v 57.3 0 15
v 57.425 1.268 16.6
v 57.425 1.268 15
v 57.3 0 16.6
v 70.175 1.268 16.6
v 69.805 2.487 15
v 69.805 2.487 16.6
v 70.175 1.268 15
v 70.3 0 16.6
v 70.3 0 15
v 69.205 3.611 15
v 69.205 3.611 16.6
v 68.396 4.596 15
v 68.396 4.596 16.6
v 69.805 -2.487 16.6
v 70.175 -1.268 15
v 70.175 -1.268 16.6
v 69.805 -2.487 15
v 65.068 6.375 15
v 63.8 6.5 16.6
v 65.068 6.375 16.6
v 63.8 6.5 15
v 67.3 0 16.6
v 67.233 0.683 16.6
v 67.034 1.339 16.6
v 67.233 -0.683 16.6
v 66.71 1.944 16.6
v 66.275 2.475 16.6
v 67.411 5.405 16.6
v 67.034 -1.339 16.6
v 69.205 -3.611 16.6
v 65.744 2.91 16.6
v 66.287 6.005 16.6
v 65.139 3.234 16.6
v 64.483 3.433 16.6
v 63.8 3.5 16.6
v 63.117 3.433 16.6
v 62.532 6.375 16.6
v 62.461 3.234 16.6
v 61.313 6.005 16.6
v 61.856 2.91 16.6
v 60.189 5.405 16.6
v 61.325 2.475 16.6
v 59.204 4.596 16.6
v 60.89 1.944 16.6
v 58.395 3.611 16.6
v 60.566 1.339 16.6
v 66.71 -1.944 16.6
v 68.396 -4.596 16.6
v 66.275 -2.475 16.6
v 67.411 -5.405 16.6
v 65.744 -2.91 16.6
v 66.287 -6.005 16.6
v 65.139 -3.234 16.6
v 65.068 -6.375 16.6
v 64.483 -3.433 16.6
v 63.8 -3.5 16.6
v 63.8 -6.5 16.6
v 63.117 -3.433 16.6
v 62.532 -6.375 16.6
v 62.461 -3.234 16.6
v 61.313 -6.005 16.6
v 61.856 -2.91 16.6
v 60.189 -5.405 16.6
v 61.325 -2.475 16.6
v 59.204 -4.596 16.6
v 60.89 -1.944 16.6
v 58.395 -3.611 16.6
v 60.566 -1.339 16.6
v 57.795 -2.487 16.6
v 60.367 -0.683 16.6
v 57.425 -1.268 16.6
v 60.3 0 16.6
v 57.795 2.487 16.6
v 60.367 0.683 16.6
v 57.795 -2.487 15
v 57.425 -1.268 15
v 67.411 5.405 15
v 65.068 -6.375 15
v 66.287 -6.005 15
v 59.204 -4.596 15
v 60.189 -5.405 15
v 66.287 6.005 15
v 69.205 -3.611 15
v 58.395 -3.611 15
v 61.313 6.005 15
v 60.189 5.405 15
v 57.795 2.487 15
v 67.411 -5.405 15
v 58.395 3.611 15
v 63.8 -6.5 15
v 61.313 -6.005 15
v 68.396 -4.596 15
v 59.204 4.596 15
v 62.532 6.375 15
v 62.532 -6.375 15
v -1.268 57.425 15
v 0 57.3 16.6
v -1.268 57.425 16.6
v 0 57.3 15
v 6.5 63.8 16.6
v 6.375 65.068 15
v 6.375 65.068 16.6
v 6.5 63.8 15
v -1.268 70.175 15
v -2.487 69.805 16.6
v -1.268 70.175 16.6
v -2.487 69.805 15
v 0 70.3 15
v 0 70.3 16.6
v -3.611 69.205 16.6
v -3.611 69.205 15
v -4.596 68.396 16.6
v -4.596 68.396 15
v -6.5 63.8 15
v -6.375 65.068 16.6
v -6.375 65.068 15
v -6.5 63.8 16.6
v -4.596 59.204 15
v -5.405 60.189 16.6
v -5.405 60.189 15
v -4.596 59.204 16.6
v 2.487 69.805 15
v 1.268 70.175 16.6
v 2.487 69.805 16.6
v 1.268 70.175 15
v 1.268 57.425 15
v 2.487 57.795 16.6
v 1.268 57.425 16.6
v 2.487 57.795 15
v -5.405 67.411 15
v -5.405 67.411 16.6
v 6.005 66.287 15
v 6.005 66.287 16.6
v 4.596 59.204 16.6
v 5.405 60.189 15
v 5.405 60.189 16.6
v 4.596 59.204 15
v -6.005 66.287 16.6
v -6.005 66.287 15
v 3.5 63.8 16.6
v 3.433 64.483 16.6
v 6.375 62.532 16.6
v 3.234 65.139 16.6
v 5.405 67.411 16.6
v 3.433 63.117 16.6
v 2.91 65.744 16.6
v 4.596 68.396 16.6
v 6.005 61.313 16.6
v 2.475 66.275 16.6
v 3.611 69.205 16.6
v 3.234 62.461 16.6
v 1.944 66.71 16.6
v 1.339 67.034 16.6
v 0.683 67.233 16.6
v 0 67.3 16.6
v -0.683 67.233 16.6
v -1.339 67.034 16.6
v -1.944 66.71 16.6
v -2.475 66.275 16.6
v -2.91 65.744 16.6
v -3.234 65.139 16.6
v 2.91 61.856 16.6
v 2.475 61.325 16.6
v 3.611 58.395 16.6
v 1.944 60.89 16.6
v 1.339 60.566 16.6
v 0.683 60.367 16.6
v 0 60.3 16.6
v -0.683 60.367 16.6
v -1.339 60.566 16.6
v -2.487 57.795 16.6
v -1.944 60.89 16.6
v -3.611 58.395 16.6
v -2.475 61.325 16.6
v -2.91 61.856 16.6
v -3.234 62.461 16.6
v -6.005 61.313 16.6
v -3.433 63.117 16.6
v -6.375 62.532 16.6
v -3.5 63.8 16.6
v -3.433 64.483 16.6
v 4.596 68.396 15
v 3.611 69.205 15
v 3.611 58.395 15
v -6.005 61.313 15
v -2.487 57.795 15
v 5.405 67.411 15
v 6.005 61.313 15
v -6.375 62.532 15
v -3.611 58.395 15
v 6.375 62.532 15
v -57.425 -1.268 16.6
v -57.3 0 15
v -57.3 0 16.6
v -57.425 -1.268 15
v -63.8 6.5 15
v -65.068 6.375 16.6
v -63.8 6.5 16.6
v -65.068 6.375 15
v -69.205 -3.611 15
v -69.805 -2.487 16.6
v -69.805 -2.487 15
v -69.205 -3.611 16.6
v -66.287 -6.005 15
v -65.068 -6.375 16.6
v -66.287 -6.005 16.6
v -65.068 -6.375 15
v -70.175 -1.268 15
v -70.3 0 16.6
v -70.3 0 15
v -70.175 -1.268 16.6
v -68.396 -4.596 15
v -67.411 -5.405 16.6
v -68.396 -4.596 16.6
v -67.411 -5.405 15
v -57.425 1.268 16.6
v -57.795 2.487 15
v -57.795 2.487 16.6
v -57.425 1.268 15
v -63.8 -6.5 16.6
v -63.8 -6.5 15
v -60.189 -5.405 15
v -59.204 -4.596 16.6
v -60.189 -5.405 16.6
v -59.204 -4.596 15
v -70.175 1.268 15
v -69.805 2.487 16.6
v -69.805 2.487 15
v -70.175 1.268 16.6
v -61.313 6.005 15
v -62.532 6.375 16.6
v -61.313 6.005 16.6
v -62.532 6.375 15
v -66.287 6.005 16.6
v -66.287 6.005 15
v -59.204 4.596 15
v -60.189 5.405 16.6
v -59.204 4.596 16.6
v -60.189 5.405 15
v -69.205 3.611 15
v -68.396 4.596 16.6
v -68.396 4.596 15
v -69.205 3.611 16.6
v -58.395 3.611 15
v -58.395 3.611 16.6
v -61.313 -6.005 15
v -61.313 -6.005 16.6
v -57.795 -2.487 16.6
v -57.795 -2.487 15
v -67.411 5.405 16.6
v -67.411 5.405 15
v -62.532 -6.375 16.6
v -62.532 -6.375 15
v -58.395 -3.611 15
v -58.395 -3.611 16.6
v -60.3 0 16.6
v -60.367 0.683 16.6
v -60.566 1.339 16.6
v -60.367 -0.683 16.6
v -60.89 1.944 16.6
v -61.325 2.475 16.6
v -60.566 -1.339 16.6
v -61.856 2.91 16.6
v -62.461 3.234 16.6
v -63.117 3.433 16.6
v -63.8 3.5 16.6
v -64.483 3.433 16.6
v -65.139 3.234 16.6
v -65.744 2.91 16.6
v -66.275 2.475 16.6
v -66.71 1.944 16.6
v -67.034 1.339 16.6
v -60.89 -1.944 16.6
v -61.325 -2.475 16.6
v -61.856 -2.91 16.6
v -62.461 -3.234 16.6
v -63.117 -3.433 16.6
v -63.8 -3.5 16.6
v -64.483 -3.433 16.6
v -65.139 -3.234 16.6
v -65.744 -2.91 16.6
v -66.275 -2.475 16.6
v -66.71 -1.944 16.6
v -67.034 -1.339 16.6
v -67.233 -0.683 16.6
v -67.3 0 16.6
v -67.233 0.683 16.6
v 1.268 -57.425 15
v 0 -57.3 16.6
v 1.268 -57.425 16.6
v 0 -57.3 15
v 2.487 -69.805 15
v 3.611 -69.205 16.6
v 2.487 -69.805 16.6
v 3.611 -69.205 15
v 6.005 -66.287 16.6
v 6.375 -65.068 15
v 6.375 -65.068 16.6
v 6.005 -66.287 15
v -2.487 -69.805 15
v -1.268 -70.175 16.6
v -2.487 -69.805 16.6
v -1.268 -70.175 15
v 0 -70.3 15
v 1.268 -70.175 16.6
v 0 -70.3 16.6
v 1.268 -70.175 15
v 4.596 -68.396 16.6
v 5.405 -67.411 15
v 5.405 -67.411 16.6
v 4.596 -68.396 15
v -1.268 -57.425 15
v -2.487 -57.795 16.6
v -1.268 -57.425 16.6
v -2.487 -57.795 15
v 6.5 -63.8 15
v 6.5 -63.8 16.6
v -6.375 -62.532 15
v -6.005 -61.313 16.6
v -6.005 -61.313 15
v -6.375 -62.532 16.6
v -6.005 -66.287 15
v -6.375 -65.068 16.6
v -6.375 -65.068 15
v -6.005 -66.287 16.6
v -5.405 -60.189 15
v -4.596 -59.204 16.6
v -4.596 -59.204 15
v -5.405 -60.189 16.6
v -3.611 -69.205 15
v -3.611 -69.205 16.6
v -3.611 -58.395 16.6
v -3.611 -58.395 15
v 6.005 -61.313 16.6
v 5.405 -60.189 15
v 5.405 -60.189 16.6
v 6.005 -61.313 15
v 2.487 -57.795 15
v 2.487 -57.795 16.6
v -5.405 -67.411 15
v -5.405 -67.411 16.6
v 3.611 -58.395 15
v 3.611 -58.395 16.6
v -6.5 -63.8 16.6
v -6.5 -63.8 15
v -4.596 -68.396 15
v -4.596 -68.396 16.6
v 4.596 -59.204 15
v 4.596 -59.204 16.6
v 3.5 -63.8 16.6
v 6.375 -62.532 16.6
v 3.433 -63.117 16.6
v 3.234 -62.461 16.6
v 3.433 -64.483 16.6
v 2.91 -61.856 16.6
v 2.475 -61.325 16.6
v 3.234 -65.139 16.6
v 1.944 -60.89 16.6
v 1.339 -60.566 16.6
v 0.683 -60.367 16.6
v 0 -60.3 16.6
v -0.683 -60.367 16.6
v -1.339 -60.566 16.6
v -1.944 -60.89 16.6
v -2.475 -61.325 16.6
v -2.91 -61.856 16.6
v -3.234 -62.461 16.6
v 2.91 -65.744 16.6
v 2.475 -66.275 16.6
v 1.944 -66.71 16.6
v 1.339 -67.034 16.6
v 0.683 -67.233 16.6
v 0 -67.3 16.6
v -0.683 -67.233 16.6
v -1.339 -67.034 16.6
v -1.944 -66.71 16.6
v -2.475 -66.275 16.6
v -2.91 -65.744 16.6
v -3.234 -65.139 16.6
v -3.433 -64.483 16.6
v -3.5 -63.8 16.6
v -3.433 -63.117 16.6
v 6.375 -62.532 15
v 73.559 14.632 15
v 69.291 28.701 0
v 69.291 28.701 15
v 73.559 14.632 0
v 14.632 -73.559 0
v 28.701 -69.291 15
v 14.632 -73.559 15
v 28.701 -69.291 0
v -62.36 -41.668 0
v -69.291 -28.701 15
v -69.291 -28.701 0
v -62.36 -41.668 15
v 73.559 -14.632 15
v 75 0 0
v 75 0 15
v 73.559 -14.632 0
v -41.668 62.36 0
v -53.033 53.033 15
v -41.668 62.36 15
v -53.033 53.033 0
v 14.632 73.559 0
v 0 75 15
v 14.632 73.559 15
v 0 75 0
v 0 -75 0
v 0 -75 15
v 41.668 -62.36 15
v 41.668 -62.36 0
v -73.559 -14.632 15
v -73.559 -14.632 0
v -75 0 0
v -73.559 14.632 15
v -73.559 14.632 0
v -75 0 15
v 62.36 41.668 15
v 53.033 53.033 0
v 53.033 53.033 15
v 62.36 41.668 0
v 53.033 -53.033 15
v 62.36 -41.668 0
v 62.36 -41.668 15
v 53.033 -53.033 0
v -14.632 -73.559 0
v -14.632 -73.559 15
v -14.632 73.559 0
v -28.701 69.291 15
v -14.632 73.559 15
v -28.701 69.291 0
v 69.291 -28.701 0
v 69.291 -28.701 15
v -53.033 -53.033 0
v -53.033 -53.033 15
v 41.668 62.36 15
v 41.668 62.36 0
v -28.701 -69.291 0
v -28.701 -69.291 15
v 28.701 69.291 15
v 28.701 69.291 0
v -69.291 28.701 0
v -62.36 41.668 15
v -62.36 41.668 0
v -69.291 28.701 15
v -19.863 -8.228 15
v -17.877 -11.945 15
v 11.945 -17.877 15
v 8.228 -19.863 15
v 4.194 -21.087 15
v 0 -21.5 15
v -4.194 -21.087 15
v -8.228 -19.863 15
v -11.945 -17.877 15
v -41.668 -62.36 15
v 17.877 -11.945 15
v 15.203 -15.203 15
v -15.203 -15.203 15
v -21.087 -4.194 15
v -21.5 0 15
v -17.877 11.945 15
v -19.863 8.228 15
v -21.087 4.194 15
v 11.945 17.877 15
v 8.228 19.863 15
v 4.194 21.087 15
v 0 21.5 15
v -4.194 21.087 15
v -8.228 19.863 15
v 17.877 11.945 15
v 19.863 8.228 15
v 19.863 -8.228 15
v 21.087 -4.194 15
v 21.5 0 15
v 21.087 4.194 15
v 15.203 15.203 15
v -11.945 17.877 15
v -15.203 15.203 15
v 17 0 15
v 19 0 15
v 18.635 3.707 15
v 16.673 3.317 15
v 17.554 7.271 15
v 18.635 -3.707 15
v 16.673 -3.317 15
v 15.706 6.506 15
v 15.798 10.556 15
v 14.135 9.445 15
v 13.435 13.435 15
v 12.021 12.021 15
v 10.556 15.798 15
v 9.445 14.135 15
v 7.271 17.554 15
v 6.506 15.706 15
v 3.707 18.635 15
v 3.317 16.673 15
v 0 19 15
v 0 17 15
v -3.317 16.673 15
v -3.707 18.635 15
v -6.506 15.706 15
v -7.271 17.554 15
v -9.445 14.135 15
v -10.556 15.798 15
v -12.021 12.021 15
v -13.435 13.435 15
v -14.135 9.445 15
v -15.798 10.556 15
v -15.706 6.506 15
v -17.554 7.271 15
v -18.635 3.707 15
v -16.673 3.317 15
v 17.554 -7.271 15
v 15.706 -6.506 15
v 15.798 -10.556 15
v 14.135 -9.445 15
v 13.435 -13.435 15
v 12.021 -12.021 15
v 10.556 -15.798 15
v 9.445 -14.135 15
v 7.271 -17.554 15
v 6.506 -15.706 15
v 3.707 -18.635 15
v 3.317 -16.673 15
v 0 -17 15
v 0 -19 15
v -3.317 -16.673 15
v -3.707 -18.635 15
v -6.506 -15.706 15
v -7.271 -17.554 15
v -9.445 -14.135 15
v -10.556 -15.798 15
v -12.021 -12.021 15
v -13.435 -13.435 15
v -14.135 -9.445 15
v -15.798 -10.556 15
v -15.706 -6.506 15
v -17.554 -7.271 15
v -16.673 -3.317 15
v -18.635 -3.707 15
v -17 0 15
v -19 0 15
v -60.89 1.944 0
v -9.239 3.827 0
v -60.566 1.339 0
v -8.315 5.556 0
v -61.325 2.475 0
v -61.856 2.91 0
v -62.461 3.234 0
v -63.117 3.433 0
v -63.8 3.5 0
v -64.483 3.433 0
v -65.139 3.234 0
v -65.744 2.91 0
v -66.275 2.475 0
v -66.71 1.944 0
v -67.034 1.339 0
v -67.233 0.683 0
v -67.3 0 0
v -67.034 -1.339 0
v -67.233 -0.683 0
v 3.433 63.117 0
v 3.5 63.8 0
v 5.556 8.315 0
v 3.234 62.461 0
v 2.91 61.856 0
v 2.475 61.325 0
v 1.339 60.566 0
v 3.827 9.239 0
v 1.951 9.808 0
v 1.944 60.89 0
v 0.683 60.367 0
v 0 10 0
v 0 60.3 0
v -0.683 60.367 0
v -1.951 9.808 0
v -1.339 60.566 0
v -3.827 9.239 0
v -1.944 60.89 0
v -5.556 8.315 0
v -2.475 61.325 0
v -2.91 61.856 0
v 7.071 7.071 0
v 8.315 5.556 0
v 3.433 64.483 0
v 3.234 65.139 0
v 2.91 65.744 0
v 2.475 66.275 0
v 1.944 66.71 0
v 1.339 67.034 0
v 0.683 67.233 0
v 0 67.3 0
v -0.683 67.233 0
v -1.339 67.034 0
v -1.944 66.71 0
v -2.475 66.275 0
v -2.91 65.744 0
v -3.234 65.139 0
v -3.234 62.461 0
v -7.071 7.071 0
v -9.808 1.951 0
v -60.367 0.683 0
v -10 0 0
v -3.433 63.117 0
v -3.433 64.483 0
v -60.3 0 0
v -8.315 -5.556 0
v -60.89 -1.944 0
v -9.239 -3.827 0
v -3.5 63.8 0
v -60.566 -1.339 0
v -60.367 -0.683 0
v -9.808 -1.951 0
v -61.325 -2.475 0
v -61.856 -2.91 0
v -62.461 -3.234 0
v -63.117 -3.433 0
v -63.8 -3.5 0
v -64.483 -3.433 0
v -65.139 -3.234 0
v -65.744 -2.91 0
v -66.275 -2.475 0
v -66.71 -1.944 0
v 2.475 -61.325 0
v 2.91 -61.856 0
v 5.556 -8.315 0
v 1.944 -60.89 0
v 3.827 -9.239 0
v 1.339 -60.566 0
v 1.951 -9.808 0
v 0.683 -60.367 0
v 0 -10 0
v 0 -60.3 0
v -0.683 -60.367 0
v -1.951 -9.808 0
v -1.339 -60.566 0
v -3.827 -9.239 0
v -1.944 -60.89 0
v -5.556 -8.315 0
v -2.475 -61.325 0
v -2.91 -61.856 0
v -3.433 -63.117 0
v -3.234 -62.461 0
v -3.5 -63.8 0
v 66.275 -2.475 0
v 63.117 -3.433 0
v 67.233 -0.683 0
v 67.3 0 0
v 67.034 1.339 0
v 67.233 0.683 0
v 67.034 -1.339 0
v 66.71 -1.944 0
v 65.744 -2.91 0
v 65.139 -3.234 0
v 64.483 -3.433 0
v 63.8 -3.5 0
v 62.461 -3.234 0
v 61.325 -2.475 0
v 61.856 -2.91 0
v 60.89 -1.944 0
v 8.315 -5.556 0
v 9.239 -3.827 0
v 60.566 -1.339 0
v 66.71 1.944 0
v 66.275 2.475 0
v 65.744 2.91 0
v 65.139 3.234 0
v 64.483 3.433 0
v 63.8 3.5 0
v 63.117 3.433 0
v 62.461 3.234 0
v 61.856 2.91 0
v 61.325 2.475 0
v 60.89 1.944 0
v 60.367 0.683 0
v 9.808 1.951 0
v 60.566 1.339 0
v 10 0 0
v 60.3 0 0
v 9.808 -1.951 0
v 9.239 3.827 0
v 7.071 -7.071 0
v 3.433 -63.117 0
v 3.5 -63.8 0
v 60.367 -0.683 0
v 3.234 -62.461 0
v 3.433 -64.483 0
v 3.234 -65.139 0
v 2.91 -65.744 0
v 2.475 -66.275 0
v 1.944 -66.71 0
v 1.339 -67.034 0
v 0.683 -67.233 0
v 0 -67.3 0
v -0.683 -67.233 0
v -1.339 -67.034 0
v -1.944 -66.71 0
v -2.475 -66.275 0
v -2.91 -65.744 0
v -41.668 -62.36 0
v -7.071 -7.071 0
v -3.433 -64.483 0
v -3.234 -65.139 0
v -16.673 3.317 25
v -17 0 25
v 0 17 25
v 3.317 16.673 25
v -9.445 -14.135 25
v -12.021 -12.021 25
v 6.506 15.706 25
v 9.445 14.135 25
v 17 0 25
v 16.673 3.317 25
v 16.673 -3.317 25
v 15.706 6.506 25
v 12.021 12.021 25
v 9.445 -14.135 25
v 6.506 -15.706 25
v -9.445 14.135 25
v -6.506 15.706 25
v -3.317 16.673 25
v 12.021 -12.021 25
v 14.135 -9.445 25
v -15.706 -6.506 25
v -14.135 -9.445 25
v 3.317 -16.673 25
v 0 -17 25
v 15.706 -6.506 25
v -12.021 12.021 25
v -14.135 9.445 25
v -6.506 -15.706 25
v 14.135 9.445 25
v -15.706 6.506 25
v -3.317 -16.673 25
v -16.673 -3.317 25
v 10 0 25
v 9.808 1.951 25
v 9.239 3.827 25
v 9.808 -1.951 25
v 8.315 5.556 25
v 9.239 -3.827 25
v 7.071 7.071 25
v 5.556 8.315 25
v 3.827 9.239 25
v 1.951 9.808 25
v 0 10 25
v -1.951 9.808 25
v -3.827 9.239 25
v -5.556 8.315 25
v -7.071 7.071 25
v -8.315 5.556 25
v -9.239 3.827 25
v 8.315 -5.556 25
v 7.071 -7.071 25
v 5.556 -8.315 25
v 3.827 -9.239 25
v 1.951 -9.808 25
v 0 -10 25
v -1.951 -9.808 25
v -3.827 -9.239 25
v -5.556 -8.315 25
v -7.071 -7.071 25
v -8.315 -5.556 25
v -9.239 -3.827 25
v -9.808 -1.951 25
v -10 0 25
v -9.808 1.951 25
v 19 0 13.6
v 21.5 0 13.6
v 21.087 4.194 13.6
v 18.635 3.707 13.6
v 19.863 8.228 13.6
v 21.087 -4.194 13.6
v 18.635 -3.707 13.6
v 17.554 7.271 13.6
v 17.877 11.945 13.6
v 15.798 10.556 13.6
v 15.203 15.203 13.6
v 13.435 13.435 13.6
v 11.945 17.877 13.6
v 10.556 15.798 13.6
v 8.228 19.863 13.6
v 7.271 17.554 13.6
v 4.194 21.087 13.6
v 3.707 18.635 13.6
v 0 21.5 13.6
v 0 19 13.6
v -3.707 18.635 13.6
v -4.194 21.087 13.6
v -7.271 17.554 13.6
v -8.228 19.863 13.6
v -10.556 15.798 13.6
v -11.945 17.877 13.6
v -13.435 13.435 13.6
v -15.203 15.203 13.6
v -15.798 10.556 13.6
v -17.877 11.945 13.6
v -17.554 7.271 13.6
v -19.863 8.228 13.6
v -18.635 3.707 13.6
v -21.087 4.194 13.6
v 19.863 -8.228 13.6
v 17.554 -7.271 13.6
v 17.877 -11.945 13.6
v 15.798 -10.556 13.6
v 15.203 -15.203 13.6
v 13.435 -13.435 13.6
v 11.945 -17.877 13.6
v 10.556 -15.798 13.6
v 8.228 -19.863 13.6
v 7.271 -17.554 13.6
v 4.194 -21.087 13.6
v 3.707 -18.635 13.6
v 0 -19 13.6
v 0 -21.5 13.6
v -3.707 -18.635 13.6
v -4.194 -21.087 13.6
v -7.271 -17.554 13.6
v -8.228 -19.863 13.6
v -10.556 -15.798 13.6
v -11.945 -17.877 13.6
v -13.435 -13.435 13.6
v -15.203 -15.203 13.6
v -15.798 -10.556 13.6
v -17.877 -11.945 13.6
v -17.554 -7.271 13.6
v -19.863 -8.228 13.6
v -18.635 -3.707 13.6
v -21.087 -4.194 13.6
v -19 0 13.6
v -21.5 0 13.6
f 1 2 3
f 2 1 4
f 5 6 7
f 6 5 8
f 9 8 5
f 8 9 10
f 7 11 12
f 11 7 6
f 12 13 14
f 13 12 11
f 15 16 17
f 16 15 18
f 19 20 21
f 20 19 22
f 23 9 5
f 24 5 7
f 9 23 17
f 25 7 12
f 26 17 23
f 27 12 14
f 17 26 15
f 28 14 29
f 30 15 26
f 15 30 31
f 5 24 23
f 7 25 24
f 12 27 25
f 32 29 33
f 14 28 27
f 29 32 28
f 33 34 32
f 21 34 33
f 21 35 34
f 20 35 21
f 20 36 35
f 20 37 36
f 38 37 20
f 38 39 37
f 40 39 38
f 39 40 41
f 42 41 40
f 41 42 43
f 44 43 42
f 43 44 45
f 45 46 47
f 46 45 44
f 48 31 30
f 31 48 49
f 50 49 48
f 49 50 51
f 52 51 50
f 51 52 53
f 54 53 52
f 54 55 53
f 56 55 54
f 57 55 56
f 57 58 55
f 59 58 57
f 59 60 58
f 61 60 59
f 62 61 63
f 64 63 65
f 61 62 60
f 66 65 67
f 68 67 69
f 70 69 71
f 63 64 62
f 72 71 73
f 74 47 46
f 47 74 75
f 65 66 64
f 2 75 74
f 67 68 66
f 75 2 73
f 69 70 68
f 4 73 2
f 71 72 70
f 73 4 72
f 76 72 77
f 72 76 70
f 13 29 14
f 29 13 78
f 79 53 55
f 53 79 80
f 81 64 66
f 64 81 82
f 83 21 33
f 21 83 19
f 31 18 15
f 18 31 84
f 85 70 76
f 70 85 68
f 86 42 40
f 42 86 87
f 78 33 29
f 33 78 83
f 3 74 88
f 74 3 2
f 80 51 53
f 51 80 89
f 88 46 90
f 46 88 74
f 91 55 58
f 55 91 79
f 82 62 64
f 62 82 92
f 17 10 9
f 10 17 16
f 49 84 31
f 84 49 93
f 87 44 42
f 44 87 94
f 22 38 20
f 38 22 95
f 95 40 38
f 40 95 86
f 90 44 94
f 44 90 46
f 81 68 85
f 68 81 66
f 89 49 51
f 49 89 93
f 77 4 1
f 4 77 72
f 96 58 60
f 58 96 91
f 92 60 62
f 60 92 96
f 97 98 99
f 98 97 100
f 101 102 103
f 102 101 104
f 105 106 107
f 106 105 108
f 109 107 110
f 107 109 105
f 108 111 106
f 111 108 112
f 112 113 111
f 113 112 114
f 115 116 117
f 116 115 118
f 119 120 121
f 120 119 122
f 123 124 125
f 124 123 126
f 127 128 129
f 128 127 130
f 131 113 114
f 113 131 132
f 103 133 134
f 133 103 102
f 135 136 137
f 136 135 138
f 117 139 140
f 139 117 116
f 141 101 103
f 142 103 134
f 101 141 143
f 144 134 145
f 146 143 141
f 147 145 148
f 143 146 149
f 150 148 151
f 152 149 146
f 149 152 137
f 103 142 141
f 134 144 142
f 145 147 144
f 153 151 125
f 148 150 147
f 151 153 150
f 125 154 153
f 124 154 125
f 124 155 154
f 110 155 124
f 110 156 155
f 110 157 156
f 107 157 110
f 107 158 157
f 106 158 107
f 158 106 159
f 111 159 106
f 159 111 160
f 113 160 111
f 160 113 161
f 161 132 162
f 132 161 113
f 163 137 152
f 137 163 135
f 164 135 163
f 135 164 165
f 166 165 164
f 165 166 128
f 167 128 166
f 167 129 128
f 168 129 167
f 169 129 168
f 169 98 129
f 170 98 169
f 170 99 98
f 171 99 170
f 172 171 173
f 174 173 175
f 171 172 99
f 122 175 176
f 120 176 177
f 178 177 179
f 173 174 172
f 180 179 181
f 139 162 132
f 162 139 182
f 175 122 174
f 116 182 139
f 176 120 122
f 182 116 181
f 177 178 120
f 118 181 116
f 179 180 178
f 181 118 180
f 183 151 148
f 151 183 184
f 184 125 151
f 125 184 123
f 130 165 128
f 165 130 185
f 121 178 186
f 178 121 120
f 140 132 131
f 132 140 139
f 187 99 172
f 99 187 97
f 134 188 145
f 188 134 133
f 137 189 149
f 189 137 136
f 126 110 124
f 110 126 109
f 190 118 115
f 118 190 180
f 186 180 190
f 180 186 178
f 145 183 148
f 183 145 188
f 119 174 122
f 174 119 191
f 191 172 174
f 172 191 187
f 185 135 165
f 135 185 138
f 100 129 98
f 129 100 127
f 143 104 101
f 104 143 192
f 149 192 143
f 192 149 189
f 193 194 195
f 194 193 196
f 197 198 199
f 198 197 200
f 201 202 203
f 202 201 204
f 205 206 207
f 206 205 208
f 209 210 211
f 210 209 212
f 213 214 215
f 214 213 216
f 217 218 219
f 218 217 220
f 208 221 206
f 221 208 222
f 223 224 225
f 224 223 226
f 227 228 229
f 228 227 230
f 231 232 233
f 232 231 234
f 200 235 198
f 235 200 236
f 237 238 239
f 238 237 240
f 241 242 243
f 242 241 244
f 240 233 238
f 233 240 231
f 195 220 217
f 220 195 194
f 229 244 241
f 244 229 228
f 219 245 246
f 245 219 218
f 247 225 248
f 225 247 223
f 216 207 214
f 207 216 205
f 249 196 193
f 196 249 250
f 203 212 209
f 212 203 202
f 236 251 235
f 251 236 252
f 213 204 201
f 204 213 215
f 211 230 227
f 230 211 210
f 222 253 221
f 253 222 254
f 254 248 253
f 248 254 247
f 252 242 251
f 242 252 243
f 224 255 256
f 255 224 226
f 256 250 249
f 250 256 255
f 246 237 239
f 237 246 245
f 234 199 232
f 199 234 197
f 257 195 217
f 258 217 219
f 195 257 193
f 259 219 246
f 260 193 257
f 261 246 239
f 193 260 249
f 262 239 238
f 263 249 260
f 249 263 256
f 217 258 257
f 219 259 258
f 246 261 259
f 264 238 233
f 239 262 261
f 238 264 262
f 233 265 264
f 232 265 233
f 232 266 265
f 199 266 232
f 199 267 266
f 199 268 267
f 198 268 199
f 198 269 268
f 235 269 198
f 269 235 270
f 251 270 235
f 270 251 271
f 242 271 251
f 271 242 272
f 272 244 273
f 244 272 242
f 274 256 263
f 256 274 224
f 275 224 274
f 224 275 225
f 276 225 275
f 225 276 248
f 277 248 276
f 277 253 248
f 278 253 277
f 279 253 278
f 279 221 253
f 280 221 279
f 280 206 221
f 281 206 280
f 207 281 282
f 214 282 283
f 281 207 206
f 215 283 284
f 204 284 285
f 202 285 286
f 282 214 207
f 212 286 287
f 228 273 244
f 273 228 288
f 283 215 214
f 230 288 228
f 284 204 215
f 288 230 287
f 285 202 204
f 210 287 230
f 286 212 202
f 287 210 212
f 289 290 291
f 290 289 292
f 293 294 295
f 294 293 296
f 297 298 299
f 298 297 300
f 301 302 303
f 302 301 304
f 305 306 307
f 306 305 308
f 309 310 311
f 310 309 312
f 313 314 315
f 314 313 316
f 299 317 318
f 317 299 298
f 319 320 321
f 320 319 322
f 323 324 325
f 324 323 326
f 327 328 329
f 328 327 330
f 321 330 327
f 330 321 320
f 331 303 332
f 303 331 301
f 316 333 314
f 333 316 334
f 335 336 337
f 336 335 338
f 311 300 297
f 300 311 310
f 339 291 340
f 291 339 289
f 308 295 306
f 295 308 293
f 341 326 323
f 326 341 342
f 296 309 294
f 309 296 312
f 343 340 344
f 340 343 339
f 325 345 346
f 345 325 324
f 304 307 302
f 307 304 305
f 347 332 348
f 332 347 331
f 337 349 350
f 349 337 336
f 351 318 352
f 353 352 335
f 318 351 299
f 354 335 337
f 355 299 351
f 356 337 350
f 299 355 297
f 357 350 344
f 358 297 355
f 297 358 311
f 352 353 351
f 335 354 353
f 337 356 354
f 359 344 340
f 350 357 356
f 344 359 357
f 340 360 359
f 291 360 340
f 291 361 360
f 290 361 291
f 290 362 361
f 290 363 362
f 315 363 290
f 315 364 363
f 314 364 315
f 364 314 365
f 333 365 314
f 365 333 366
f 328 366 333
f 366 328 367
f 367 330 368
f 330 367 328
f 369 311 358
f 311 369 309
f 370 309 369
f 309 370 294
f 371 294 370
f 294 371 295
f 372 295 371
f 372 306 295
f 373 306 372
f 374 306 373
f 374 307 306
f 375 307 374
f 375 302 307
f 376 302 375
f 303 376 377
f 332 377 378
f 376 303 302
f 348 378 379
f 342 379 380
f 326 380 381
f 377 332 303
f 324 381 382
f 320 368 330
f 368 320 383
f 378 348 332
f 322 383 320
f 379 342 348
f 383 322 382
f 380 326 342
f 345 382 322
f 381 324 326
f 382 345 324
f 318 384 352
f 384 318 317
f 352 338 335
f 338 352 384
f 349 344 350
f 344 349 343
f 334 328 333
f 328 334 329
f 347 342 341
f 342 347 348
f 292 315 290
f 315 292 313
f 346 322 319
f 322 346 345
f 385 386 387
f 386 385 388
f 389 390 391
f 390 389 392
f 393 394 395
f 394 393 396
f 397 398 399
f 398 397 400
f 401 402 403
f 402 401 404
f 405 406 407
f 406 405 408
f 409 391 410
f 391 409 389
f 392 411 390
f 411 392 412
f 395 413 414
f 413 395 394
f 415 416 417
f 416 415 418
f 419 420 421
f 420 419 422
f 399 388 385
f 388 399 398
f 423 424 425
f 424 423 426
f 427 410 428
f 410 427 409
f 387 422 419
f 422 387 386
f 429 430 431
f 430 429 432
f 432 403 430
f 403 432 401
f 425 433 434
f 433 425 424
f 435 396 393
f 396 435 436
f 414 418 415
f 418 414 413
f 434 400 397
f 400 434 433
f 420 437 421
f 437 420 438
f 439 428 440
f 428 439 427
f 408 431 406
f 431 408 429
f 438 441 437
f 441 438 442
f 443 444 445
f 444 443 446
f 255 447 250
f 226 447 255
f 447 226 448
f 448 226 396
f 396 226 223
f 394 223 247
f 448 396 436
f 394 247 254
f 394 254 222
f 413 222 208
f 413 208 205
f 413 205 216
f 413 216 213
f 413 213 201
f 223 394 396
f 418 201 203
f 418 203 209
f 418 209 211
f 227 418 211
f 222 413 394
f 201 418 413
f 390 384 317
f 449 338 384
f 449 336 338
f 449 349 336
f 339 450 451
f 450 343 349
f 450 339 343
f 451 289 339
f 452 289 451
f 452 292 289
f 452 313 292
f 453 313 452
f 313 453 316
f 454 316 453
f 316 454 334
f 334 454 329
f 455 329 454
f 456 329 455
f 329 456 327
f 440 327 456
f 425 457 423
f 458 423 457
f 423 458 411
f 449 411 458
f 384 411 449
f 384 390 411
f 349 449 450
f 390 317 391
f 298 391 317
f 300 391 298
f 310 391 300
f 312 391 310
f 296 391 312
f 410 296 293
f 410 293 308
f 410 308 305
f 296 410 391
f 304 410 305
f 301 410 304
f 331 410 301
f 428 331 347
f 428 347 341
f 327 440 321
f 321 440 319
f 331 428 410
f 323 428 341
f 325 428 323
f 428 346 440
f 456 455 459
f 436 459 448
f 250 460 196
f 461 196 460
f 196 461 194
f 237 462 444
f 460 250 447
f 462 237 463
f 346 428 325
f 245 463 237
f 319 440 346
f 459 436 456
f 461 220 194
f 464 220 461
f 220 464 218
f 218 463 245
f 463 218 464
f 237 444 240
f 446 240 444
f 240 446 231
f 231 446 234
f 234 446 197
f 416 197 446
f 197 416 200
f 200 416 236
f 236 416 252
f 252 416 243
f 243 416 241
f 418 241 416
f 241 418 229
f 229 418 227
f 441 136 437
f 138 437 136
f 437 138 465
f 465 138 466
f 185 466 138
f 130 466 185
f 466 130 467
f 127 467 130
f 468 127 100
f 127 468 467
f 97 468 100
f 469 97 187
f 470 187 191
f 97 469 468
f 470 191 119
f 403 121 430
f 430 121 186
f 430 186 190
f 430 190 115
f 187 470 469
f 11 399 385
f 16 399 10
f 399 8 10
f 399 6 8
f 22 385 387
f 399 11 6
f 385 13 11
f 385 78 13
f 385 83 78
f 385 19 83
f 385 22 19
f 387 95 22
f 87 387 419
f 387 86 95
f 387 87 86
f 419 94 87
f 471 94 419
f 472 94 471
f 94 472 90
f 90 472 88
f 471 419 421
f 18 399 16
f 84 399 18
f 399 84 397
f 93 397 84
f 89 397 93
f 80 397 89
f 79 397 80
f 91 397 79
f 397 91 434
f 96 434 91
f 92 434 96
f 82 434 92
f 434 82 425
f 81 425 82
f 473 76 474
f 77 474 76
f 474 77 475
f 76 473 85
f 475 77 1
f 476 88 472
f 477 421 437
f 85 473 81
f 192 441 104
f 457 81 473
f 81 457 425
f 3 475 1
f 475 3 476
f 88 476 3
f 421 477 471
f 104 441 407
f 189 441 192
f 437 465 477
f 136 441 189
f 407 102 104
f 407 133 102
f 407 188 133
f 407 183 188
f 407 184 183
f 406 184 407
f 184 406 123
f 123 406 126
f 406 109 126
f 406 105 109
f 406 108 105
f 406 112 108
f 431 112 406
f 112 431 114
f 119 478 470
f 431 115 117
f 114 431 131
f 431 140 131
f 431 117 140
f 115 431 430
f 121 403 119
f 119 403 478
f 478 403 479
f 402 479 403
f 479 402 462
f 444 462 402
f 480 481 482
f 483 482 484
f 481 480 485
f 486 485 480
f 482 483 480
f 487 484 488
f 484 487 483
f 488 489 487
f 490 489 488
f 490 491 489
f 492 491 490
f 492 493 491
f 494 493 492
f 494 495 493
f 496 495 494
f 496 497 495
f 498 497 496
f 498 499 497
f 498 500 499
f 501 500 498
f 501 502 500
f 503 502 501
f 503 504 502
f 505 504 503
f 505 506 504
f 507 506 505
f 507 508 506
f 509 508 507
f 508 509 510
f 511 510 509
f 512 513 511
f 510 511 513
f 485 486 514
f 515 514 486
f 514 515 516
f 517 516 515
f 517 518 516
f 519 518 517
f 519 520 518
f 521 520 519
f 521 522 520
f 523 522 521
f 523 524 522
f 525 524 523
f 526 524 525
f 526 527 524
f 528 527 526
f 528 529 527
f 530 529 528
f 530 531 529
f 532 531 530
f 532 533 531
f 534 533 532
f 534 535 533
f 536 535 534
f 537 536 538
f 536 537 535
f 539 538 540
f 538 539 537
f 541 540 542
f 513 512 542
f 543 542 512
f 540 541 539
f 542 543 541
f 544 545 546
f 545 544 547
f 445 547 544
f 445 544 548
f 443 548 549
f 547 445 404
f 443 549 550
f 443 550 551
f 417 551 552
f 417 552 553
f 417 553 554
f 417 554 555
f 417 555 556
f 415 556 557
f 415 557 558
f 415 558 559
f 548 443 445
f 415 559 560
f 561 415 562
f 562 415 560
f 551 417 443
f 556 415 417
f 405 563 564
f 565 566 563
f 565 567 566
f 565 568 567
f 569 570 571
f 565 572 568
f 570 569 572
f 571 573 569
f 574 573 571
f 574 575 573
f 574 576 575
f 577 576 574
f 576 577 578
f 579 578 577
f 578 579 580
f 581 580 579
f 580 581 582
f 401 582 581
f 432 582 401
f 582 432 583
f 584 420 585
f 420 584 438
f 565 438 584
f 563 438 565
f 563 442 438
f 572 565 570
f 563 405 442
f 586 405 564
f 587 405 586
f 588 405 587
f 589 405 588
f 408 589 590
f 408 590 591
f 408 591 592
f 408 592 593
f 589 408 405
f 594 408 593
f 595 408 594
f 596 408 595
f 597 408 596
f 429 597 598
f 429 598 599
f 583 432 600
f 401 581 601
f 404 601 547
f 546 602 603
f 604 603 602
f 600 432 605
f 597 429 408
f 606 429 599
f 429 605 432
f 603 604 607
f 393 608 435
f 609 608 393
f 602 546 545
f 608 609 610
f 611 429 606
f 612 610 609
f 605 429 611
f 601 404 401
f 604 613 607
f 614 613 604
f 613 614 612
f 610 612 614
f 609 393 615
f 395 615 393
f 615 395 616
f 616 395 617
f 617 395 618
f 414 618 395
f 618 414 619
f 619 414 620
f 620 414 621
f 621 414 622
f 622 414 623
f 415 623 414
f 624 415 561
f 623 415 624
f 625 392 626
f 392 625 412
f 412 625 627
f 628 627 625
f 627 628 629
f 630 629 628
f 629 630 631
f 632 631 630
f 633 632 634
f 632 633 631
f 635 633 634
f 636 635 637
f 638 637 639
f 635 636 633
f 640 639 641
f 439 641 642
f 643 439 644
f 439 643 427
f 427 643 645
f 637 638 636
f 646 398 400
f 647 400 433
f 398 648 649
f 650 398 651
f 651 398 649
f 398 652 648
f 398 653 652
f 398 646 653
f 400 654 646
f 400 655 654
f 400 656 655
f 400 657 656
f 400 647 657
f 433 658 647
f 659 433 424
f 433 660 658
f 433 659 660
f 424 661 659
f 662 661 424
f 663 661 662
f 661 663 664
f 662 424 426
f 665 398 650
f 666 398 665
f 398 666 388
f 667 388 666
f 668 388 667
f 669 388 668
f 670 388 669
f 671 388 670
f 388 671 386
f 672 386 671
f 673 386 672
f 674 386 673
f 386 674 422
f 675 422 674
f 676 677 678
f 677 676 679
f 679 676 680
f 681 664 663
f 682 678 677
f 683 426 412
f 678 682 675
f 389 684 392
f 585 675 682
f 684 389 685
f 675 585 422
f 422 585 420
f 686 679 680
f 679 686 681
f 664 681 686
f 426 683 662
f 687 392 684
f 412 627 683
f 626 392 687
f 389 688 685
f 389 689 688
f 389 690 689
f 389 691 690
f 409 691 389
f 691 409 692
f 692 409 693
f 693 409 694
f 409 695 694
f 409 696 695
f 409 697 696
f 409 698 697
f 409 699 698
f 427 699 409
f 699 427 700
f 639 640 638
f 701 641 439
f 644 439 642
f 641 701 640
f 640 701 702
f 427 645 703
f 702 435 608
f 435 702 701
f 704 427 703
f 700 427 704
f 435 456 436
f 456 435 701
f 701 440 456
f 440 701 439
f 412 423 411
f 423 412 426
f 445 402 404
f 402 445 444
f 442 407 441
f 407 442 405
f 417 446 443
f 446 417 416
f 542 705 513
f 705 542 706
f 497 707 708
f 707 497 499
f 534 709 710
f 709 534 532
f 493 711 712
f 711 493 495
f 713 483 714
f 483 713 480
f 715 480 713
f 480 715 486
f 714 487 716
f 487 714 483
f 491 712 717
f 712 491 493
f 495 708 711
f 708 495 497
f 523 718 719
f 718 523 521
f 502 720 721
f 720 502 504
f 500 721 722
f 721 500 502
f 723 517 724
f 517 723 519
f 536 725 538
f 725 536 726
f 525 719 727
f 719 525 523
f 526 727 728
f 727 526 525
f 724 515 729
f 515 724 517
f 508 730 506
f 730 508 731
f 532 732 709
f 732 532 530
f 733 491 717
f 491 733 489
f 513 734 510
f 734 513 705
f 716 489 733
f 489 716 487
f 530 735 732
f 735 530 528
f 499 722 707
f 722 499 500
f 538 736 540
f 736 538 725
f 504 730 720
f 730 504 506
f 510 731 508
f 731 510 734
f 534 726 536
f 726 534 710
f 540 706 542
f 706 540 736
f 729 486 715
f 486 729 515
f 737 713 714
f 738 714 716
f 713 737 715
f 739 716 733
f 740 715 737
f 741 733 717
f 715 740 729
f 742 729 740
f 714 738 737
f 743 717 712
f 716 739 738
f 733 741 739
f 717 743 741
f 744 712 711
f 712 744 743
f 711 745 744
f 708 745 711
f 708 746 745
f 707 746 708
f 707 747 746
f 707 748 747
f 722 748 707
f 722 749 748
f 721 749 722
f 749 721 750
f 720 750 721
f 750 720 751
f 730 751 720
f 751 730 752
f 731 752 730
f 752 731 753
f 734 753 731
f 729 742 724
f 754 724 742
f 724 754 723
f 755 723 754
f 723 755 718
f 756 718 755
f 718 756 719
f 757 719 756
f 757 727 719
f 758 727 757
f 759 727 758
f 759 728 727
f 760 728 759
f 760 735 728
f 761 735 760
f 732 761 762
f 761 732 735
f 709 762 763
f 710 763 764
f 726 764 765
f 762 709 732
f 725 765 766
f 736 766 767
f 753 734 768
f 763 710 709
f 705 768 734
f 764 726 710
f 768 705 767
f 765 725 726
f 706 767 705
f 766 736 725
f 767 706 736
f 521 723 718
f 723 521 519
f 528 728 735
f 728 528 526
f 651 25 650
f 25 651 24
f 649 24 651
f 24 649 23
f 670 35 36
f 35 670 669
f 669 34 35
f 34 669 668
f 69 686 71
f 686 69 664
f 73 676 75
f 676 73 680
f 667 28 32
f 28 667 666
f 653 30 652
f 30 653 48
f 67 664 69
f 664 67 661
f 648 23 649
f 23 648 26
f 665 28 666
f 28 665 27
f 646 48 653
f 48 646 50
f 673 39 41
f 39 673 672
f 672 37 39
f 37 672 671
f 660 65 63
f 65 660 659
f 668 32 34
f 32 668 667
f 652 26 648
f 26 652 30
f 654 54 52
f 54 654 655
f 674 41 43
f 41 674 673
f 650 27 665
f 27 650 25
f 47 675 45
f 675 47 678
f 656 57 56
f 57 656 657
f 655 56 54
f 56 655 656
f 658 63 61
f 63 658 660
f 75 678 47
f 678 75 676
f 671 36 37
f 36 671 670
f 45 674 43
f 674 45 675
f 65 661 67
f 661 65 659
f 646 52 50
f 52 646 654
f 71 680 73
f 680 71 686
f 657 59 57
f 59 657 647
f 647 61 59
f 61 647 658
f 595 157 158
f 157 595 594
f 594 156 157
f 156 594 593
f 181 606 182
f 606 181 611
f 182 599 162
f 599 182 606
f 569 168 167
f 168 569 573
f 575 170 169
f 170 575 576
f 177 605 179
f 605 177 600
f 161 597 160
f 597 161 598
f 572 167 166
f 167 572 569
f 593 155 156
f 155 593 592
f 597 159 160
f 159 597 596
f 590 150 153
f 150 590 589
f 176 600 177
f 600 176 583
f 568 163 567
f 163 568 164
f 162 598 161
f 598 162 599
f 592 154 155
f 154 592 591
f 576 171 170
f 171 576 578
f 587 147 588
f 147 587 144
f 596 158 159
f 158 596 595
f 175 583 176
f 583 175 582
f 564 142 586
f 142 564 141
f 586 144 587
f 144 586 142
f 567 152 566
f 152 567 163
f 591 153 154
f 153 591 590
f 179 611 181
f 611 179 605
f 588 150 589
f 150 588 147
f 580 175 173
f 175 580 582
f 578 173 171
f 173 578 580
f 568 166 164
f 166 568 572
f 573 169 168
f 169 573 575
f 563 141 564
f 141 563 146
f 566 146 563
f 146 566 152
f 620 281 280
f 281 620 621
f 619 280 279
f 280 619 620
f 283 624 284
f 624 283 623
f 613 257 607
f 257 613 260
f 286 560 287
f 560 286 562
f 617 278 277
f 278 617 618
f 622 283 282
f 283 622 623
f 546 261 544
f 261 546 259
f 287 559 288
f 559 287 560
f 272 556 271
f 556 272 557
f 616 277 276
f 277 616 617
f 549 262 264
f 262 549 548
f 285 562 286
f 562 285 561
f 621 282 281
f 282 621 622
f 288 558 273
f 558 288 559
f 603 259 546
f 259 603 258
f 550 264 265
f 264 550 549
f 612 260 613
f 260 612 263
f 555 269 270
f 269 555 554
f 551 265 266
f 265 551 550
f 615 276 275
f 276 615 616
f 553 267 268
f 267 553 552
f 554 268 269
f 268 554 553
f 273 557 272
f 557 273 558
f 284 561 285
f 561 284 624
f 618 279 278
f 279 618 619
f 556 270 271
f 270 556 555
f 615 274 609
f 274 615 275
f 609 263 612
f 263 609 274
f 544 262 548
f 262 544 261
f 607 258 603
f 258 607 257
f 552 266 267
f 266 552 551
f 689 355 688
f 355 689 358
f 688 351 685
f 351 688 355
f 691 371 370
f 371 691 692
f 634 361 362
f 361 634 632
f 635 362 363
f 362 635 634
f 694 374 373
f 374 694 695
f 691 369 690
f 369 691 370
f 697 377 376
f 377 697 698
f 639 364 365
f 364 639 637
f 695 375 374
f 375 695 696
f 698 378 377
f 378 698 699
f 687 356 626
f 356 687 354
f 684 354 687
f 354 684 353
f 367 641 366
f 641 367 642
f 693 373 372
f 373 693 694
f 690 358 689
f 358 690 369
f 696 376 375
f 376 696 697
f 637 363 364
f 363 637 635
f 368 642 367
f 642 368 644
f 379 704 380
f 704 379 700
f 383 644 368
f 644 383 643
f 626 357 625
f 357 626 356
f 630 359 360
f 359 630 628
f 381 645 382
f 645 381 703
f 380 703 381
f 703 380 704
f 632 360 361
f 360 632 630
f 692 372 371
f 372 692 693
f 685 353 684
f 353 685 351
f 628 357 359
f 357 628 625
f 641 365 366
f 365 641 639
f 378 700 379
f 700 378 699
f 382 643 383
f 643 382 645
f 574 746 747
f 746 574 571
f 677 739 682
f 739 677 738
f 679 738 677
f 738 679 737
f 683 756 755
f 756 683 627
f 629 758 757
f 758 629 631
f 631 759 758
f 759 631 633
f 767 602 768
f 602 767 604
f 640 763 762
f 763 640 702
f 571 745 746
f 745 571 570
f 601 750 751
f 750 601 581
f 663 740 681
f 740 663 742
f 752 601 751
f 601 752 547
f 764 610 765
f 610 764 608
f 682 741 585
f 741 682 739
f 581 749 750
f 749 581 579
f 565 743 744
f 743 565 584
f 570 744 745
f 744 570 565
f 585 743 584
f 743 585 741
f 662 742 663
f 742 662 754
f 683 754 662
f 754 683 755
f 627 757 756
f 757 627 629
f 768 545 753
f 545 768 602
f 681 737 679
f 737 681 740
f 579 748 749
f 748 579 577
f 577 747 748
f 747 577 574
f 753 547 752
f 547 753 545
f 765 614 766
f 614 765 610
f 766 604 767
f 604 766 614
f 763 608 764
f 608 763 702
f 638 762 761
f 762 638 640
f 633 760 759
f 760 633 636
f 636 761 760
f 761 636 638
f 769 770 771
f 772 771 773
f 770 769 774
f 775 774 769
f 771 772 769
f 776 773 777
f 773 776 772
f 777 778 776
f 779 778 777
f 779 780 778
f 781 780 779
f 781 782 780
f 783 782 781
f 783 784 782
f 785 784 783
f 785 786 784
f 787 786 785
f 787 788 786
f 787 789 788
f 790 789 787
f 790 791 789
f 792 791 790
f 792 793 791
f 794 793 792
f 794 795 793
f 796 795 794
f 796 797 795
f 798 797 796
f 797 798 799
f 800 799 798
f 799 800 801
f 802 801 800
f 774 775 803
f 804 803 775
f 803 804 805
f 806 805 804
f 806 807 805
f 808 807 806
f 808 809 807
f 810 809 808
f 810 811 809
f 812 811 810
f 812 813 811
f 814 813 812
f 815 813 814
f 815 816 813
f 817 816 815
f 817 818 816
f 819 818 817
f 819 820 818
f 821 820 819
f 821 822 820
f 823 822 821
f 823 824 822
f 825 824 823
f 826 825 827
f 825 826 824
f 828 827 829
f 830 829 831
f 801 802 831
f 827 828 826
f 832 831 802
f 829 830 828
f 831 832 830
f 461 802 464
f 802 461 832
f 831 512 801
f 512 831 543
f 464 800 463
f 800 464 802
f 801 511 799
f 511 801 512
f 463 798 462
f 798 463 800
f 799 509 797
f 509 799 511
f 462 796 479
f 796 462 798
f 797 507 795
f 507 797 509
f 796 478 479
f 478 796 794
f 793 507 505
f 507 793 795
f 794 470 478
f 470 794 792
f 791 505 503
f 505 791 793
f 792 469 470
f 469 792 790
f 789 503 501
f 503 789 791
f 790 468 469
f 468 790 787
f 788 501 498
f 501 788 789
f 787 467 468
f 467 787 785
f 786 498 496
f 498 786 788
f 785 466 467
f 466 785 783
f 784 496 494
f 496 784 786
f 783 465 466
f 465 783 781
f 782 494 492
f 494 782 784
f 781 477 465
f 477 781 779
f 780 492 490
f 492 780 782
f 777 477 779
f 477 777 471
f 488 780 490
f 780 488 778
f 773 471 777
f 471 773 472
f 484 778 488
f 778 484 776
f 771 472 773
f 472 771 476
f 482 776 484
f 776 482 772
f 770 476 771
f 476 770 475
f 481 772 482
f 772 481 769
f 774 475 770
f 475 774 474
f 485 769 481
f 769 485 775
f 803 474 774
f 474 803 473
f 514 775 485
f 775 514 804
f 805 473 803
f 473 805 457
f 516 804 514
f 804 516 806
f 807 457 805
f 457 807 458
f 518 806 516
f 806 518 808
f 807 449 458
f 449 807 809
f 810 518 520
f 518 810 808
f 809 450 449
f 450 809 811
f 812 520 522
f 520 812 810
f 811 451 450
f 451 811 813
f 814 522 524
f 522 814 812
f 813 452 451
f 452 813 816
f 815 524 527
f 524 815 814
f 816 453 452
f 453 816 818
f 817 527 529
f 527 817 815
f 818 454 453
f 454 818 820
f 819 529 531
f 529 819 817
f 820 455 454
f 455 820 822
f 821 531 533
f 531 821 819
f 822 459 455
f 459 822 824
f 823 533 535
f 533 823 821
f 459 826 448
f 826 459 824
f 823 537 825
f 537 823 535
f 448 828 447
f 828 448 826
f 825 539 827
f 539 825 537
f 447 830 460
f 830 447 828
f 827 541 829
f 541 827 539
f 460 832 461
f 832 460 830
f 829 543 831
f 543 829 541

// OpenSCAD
$fn = 32;

// ----------------------------------------------------------------------
// Bolt-circle flange: 150 mm outside, 4 bolt holes, bore 20 mm
// ----------------------------------------------------------------------

// --- parameters (mm) ---
flange_d = 150;           // flange outside diameter
flange_t = 15;            // flange thickness
bolts = 4;                // number of bolt holes
bolt_d = 7;               // bolt clearance
bolt_r = 63.8;            // bolt circle radius
bore_d = 20;              // centre bore
hub_d = 34;               // raised hub diameter
hub_h = 10;               // raised hub height
spot_d = 13;              // spot faced bosses
spot_h = 1.6;             // spot face height
groove_w = 2.5;           // gasket groove width
groove_d = 1.4;           // gasket groove depth
groove_r = 19;            // groove radius
groove_z = 13.6;          // groove floor depth from the face

module body() {
  cylinder(h = flange_t, d = flange_d);
  /* raised hub, sunk 1 mm into the flange */
  translate([0, 0, flange_t - 1]) cylinder(h = hub_h + 1, d = hub_d);
  /* spot faced pads under the bolt heads */
  for (i = [0 : bolts - 1]) rotate([0, 0, i * 360 / bolts]) translate([bolt_r, 0, flange_t - 1]) cylinder(h = spot_h + 1, d = spot_d);
}

difference() {
  body();
  /* bolt circle */
  for (i = [0 : bolts - 1]) rotate([0, 0, i * 360 / bolts]) translate([bolt_r, 0, -1]) cylinder(h = flange_t + hub_h + 3, d = bolt_d);
  translate([0, 0, -1]) cylinder(h = flange_t + hub_h + 3, d = bore_d);
  /* gasket groove on the front face */
  rotate_extrude() translate([groove_r, groove_z]) square([groove_w, groove_d + 1]);
}
